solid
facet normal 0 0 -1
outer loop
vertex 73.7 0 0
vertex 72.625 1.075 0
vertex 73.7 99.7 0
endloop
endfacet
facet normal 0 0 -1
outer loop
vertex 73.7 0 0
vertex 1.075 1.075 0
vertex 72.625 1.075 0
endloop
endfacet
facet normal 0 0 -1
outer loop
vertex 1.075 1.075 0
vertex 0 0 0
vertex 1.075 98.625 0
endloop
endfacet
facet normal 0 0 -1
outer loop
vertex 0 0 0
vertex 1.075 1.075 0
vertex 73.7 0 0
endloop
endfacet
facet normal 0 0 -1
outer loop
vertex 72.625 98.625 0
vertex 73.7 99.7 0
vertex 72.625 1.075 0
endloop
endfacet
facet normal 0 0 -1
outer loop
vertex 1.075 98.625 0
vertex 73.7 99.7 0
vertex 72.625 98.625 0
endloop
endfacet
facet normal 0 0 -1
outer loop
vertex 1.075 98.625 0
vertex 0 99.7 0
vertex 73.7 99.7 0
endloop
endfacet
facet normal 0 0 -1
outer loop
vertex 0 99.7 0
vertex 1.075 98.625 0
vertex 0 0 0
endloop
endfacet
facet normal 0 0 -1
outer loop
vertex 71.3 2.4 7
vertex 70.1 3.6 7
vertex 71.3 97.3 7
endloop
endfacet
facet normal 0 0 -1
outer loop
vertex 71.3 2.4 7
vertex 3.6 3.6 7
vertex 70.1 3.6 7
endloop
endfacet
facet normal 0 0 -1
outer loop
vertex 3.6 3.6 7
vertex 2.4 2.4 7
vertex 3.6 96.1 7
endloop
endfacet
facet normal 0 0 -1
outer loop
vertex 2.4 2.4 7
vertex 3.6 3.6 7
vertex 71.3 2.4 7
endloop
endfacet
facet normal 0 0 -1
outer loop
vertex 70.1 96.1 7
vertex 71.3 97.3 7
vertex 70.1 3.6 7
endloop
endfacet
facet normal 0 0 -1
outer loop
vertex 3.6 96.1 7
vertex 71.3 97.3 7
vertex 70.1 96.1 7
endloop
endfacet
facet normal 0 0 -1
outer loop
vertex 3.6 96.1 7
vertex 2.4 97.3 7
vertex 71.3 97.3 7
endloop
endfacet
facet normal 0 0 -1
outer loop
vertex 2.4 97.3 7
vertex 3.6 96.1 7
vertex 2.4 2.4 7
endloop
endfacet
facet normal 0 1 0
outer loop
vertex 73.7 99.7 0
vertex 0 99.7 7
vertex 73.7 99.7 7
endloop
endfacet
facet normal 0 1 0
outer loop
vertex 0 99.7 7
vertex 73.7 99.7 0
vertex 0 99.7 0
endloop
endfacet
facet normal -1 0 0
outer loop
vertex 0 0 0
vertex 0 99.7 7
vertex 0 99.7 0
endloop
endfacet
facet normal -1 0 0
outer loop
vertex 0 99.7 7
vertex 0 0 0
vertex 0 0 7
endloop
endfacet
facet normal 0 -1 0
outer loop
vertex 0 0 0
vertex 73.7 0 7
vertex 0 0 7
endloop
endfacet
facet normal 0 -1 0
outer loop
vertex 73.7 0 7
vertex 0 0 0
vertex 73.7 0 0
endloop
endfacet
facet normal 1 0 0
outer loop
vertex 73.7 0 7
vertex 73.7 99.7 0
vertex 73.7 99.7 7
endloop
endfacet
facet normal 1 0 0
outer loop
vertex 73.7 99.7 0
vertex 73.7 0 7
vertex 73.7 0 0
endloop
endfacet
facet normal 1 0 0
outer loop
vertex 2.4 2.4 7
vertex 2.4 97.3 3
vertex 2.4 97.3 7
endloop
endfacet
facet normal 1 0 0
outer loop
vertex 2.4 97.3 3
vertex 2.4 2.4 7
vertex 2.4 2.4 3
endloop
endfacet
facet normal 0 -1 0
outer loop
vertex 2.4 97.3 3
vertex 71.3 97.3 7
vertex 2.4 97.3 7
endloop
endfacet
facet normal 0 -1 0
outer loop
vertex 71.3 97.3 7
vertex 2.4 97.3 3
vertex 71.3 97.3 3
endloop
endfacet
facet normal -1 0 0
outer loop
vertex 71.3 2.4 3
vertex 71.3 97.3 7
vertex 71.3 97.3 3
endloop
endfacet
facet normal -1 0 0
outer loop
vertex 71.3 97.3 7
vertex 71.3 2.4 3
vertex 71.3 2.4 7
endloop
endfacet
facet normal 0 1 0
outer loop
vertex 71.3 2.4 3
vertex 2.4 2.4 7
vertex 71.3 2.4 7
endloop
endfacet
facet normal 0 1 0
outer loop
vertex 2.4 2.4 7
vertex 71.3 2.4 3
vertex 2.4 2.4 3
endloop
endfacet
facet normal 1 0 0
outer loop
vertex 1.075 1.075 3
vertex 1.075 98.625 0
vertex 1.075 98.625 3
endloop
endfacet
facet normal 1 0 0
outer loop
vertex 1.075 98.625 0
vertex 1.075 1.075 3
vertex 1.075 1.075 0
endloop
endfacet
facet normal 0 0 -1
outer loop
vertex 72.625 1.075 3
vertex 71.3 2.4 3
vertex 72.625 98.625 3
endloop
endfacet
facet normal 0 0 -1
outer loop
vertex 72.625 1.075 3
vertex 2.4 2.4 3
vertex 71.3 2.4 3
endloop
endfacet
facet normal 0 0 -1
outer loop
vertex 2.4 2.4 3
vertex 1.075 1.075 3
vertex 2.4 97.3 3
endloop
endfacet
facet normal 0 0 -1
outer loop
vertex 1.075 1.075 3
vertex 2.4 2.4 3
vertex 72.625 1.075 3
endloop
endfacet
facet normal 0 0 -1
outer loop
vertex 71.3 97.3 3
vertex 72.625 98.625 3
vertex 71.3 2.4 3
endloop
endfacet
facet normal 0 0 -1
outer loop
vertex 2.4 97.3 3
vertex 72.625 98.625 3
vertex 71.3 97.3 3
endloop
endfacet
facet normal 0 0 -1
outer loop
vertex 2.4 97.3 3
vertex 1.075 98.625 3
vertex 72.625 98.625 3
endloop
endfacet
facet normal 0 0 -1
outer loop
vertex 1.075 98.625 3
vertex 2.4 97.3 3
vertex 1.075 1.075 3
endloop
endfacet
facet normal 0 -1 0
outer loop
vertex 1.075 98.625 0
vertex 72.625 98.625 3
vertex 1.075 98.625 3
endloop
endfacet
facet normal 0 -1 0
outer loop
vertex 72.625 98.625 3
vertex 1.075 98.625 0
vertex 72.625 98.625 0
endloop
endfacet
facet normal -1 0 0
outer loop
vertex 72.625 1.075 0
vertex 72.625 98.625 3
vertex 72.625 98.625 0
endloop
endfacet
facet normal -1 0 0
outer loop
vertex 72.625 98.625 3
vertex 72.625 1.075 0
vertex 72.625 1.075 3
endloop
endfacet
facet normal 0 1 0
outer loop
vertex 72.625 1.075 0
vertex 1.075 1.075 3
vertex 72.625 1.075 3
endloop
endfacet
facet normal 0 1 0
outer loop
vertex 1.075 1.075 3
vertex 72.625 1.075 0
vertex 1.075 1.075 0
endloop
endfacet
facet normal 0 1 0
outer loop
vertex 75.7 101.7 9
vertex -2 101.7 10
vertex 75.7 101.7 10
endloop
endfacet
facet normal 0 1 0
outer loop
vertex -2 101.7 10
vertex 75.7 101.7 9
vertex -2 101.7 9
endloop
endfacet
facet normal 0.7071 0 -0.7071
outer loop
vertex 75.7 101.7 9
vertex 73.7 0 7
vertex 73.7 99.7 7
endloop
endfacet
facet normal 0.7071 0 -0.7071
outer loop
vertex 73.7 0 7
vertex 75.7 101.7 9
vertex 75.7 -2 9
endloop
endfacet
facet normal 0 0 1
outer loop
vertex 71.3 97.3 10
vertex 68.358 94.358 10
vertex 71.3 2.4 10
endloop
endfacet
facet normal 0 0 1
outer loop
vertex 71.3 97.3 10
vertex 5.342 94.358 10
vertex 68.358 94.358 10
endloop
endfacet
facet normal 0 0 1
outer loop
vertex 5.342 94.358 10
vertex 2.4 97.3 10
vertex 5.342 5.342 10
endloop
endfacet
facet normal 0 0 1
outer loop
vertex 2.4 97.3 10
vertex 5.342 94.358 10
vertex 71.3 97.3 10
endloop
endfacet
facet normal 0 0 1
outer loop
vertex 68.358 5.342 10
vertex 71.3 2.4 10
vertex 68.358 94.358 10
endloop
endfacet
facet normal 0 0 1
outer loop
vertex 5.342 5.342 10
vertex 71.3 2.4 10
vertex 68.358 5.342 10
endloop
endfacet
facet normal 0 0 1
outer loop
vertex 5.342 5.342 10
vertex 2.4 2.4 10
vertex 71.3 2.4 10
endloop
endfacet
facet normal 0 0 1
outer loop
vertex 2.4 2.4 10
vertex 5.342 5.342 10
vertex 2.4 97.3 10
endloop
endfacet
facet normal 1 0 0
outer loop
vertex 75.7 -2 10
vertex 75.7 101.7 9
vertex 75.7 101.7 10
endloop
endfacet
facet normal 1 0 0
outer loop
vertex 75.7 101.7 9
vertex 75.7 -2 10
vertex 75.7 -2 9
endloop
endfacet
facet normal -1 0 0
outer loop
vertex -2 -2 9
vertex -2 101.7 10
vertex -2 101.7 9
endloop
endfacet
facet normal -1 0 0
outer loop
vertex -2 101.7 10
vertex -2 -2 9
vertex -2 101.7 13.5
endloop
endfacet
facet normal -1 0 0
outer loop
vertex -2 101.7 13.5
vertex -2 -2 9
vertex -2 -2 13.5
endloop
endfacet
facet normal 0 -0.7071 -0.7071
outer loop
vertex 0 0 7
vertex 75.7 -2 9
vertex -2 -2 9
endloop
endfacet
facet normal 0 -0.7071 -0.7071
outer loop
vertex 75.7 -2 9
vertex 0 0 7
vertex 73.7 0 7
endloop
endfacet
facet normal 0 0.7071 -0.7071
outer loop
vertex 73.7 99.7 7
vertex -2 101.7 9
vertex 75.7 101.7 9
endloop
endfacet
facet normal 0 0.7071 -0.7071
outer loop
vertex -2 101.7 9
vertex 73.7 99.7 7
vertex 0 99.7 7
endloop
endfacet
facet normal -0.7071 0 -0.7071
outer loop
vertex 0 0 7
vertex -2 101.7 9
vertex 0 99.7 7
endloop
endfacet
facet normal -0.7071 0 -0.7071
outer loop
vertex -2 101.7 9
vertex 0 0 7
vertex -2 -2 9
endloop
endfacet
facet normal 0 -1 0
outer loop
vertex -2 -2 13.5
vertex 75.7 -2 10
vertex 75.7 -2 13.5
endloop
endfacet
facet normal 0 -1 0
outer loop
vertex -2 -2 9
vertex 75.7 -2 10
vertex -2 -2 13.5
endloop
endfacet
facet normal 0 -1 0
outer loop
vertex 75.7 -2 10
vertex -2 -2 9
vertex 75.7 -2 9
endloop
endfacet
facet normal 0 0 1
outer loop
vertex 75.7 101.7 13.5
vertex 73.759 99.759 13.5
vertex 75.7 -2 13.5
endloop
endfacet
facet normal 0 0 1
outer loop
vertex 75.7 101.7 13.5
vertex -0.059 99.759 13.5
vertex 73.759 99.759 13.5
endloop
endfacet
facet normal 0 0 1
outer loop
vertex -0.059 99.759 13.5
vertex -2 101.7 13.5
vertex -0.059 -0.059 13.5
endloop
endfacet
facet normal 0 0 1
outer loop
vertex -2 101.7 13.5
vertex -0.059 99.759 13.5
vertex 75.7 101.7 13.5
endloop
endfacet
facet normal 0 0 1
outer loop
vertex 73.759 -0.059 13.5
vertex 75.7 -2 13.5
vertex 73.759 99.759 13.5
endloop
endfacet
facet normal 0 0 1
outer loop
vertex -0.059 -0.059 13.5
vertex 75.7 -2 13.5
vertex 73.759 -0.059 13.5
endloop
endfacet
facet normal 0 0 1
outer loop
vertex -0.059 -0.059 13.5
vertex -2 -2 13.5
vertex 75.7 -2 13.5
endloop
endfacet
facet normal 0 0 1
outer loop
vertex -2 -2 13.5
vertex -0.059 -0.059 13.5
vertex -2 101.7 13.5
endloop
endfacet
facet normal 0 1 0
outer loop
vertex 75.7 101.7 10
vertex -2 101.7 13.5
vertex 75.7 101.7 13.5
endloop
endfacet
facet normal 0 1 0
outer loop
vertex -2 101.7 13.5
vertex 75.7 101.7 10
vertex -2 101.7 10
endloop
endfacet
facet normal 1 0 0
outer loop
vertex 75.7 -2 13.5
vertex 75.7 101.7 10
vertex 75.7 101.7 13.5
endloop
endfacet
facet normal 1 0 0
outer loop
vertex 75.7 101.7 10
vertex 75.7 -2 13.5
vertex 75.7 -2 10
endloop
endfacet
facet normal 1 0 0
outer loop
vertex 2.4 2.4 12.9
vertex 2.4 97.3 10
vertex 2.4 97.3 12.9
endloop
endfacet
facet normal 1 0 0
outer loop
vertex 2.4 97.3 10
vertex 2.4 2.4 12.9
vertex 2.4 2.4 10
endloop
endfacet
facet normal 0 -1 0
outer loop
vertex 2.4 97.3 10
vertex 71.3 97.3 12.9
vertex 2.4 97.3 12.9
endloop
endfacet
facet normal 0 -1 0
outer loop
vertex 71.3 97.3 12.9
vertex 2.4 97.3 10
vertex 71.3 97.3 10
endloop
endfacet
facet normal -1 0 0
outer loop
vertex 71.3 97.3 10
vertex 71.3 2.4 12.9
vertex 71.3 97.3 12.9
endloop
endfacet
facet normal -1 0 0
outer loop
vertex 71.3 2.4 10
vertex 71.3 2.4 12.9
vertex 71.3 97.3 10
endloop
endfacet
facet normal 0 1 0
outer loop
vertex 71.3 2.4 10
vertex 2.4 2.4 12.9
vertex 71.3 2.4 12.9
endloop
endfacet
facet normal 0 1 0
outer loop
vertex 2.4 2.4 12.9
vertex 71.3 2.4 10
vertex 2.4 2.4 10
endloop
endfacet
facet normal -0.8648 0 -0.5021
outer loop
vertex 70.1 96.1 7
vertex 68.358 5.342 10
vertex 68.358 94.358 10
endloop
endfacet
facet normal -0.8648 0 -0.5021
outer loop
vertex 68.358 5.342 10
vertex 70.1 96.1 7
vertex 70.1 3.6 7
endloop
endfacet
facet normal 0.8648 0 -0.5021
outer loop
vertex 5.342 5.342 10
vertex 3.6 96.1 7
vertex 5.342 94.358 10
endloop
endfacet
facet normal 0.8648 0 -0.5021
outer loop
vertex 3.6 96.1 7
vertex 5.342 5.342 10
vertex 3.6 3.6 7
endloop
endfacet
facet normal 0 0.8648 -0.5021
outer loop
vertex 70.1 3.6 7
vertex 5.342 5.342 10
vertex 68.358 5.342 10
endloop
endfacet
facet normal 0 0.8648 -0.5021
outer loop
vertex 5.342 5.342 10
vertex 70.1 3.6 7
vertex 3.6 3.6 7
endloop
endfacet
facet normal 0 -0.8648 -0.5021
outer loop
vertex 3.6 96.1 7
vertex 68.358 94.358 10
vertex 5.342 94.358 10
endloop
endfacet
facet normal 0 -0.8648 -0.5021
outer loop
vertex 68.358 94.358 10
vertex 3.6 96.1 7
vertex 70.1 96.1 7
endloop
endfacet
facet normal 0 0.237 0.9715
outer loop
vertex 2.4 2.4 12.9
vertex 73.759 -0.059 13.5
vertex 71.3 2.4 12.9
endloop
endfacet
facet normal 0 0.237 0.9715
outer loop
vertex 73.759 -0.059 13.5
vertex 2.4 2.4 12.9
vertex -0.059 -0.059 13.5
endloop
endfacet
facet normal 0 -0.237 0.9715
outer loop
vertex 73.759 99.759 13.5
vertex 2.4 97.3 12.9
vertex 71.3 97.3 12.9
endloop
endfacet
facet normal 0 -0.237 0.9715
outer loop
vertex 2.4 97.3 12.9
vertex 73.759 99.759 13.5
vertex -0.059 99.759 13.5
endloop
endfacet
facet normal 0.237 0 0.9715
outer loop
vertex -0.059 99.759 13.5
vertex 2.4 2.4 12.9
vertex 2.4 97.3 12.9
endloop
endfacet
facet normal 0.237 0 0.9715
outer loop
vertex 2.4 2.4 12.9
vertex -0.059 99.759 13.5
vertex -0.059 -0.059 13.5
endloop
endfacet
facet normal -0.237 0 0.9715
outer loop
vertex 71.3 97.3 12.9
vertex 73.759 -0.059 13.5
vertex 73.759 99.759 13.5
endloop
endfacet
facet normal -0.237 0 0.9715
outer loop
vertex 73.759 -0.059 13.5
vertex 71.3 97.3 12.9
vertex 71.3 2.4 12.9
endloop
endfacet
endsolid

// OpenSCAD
// Peek box: where the AI reads a card it has just drawn, WITHOUT ever turning it face-up (README, "Reading a drawn card").
// The card lies FACE-DOWN on a window; a second small camera inside the box looks up through the window and reads the face.
// A person standing at the table sees only the card's back (the washer, up) and the box's walls: the face is against the window.
// The washer is on top, so the magnet lands on it directly, with no flip. Cards are turned face-up only when they are cast.
// Three parts, one file (set `part`): "top" (window + card pocket), "base" (camera cradle, cable notch), "ring" (print 1 to 4:
// each adds `ring_h` mm between the camera and the window; how many depends on the camera's MEASURED field of view, Step 2).
// The pieces stack on tongue-and-lip joints (no glue, no screws), sit on the bed, and are taped down. Units: mm.

part      = "top";    // "top", "base" or "ring"
card_w    = 66.5;     // one inner-sleeved card, as sleeve_jig.scad
card_l    = 92.5;
clear     = 1.2;      // around the card in its pocket: a card yawed only 1 degree eats 0.8 mm of clearance (Hermes review), and the swivel does not control yaw
wall      = 2.4;
ledge     = 3.0;      // the window is this much smaller than the pocket on every side; the card's edge rests on it
plate_t   = 3.0;
skirt_h   = 7.0;      // the top piece's walls under the plate
pocket_d  = 3.5;      // how far the rim rises above the plate: a deeper pocket catches a card that lands off-centre (Opus review 2026-10-11)
rim_extra = 2.0;      // the plate and rim overhang the skirt by this much all round (with a 45 degree chamfer under it), so the rim can be thick enough for a wide lead-in
leadin    = 2.5;      // the pocket's mouth is this much wider on every side at the top
ring_h    = 30;       // one ring
base_h    = 28;       // the camera cradle and its walls
floor_t   = 2.0;
tongue_h  = 3.0;      // the joint: an inner tongue on top of each piece, an outer lip under the next
joint_gap = 0.25;     // total play in the joint (wall - tongue - lip)
cam_w     = 32.4;     // the 32 x 32 mm UVC board (innomaker), plus play
cam_hole  = 27.0;     // M2 hole pitch of that board: TBD, measure yours (calipers) and set; the holes are 2.2 mm
notch_w   = 14;       // USB cable notch in the base's short wall
notch_h   = 6;
$fn = 48;

pw = card_w + 2 * clear;          // the pocket
pl = card_l + 2 * clear;
ow = pw + 2 * wall;               // outside
ol = pl + 2 * wall;
half = (wall - joint_gap) / 2;    // tongue and lip thickness

module rect_ring(w, l, t) {       // a rectangular tube cross-section, 2D: outer w x l, wall t
    difference() { square([w, l]); translate([t, t]) square([w - 2 * t, l - 2 * t]); }
}
module tongue(h) { translate([0, 0, 0]) linear_extrude(height = h) translate([wall - half, wall - half]) rect_ring(ow - 2 * (wall - half), ol - 2 * (wall - half), half); }
// the tongue sits on the INSIDE half of the wall; the lip below is the OUTSIDE half, the inside half cut away

module walls(h, lip_below = true, tongue_above = true) {
    difference() {
        linear_extrude(height = h) rect_ring(ow, ol, wall);
        if (lip_below) translate([0, 0, -0.01]) linear_extrude(height = tongue_h + 0.01)
            translate([half, half]) square([ow - 2 * half, ol - 2 * half]);   // everything inside the outer lip is removed at the foot
    }
    if (tongue_above) translate([0, 0, h]) tongue(tongue_h);
}

module top() {
    e = rim_extra;
    difference() {
        union() {
            walls(skirt_h, true, false);
            hull() {                                                               // the plate, overhanging the skirt by `e`, with a 45 degree underside
                translate([0, 0, skirt_h + e]) translate([-e, -e, 0]) cube([ow + 2 * e, ol + 2 * e, plate_t - e]);
                translate([0, 0, skirt_h]) cube([ow, ol, 0.01]);
            }
            translate([-e, -e, skirt_h + plate_t - 0.01]) linear_extrude(height = pocket_d + 0.01) rect_ring(ow + 2 * e, ol + 2 * e, wall + e);   // the pocket's rim
        }
        hull() {                                                                   // the window: straight for its top 1.2 mm, then flared 45 degrees underneath so the ledge does not droop
            translate([ow / 2 - (pw - 2 * ledge) / 2, ol / 2 - (pl - 2 * ledge) / 2, skirt_h + plate_t - 1.2]) cube([pw - 2 * ledge, pl - 2 * ledge, 1.3]);
            translate([ow / 2 - (pw - 2 * ledge) / 2 - (plate_t - 1.2), ol / 2 - (pl - 2 * ledge) / 2 - (plate_t - 1.2), skirt_h - 0.01]) cube([pw - 2 * ledge + 2 * (plate_t - 1.2), pl - 2 * ledge + 2 * (plate_t - 1.2), 0.01]);
        }
        hull() {                                                                   // the lead-in chamfer at the pocket's mouth
            translate([wall, wall, skirt_h + plate_t + pocket_d - 0.6]) cube([pw, pl, 0.01]);
            translate([wall - leadin, wall - leadin, skirt_h + plate_t + pocket_d + 0.01]) cube([pw + 2 * leadin, pl + 2 * leadin, 0.01]);
        }
    }
}

module ring() { walls(ring_h, true, true); }

module base() {
    difference() {
        union() {
            cube([ow, ol, floor_t]);
            walls(base_h, false, true);
            for (dx = [-1, 1], dy = [-1, 1])                           // four posts: the board stands off the floor on them; M2 nylon screws go in from ABOVE into blind pilot holes
                translate([ow / 2 + dx * cam_hole / 2, ol / 2 + dy * cam_hole / 2, floor_t - 0.01]) cylinder(d = 7, h = 4.01);
            // the cradle: a stop in the middle of each edge (the old corner cubes touched the board only at a point)
            for (s_ = [-1, 1]) {
                translate([ow / 2 + s_ * (cam_w / 2 + 1.5) - 1.5, ol / 2 - 5, floor_t - 0.01]) cube([3, 10, 6]);
                translate([ow / 2 - 5, ol / 2 + s_ * (cam_w / 2 + 1.5) - 1.5, floor_t - 0.01]) cube([10, 3, 6]);
            }
        }
        for (dx = [-1, 1], dy = [-1, 1])
            translate([ow / 2 + dx * cam_hole / 2, ol / 2 + dy * cam_hole / 2, floor_t + 0.5]) cylinder(d = 1.8, h = 4);   // blind: nothing sticks out under the floor
        translate([ow / 2 - notch_w / 2, -1, floor_t]) cube([notch_w, wall + 2, notch_h]);                                   // cable out of the short wall
    }
}

if (part == "top") top();
else if (part == "ring") ring();
else base();
